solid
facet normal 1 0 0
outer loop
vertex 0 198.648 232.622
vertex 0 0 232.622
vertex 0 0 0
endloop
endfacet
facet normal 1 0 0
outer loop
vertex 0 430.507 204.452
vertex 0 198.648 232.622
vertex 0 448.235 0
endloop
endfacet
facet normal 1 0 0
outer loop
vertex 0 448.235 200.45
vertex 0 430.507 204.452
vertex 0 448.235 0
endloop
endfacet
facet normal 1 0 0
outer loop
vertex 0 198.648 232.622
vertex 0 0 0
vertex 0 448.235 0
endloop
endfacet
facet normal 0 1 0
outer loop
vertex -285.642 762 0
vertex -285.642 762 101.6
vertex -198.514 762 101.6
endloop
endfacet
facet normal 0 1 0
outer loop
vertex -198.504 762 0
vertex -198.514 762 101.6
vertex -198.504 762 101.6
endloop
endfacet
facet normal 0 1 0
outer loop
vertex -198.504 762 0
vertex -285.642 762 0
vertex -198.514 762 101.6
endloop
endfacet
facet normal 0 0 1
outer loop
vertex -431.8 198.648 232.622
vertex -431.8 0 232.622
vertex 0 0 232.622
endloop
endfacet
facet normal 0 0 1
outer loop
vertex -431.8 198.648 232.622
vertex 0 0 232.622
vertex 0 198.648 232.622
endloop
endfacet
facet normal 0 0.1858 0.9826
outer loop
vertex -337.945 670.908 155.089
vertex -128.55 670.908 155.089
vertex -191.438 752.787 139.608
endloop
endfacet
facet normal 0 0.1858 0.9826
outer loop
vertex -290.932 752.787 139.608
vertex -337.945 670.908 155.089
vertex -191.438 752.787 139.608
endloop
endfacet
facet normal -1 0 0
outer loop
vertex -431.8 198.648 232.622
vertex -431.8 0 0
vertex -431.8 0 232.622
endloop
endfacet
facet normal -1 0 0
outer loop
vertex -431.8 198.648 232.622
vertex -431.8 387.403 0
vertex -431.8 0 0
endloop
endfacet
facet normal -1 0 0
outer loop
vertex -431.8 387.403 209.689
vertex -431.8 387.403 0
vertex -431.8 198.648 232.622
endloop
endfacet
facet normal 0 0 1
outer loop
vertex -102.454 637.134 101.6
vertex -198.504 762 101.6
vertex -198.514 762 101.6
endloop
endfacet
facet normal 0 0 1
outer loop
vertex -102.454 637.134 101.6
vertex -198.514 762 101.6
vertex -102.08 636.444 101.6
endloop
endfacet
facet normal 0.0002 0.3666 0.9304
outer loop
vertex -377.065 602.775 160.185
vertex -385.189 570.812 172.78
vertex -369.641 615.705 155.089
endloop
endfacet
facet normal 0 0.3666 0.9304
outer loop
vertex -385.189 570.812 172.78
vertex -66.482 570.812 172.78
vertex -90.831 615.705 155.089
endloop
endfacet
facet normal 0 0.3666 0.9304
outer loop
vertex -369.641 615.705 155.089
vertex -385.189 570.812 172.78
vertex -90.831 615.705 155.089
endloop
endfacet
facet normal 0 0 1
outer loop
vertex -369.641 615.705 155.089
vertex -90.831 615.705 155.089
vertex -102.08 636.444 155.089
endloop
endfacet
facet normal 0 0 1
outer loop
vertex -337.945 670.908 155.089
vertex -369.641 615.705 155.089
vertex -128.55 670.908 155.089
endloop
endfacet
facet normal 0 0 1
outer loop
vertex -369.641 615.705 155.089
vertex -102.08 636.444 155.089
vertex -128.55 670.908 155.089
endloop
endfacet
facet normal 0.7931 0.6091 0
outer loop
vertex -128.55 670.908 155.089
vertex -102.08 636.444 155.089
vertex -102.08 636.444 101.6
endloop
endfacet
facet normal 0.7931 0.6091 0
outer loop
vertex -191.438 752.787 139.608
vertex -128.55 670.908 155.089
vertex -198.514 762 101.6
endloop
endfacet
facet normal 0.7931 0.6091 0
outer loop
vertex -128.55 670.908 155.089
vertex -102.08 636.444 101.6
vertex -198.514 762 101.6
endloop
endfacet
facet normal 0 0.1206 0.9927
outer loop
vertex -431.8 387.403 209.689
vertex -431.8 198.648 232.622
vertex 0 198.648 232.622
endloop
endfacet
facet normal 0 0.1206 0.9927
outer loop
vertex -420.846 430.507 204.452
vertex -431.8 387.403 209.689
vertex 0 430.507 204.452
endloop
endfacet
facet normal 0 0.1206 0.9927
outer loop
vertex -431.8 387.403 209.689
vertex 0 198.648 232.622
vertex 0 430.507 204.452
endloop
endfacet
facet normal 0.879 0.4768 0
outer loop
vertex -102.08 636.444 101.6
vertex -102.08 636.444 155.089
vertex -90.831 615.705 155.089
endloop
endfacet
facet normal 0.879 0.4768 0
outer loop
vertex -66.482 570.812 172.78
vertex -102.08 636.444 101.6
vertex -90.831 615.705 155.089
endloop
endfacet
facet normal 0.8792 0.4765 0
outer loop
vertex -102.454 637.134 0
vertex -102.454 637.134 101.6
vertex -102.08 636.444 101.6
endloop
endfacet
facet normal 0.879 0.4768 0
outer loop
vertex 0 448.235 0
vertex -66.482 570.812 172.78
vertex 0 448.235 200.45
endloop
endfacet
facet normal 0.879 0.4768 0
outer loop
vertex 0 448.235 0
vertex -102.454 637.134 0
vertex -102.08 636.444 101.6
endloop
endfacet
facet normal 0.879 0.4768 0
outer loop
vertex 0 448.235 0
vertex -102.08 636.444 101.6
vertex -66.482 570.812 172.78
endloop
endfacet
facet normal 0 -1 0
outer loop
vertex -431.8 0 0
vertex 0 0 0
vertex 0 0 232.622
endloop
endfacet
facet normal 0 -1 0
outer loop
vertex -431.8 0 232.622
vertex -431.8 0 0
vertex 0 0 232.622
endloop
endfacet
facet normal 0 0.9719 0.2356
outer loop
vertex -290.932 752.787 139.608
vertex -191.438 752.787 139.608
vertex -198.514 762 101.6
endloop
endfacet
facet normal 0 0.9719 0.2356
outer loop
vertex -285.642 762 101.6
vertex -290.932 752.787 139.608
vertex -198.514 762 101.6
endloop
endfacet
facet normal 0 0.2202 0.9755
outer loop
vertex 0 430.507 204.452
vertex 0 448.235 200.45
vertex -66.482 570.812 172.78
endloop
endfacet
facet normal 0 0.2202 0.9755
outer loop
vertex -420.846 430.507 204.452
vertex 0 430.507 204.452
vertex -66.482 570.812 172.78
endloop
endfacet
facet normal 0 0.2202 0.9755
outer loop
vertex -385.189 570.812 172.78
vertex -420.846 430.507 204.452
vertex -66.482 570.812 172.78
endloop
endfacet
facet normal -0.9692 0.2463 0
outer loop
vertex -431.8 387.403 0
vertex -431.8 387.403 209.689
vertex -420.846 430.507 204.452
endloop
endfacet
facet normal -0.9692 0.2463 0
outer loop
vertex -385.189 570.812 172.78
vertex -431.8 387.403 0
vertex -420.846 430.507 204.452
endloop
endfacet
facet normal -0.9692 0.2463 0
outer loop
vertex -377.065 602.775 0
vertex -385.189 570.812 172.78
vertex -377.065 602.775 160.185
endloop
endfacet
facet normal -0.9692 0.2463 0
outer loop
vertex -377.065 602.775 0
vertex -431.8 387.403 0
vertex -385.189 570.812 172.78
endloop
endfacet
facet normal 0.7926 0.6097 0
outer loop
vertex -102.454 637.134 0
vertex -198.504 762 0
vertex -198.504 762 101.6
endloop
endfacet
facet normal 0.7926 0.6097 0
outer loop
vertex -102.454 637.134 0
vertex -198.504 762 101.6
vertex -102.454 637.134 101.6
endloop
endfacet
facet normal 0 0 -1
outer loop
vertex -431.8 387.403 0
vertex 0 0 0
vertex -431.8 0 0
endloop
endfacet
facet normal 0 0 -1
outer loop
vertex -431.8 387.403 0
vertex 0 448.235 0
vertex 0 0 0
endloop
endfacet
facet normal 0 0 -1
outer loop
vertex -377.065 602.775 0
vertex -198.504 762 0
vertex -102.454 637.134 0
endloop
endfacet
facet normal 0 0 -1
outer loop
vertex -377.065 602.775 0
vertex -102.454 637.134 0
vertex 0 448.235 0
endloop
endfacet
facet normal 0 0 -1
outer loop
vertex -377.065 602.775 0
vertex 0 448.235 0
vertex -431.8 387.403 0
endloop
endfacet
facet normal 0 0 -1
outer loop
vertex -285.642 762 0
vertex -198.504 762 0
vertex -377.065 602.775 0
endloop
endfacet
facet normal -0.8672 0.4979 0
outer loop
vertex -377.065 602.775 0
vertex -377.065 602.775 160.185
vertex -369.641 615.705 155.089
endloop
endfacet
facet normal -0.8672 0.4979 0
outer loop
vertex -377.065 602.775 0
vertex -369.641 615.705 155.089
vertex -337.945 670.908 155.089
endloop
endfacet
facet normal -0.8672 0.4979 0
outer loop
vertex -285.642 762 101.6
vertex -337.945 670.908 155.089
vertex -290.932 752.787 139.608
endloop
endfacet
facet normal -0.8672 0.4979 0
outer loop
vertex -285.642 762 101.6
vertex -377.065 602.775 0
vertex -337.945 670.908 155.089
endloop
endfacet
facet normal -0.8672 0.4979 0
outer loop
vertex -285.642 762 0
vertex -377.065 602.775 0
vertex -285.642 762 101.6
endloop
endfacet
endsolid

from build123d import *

# Parameters (mm, degrees)
BOSS_EXTRUDE1_DEPTH = 101.6
BOSS_EXTRUDE2_DEPTH = 431.8
CUT_EXTRUDE1_DEPTH  = 132.021743181
CUT_EXTRUDE2_DEPTH  = 132.021743181
SKETCH5_W           = 672.515990181
SKETCH5_H           = 895.069856367
CUT_EXTRUDE3_DEPTH  = 233.621743181


with BuildPart() as part:
    # Sketch1 → Boss-Extrude1 (new body)
    with BuildSketch(Plane.XY):
        Polygon((0, 0), (431.8, 0), (431.8, 387.403361345), (377.065490396, 602.774956458), (285.641844577, 762), (198.504201681, 762), (102.453781513, 637.134453782), (0, 448.235294118), align=None)
    boss_extrude1 = extrude(amount=BOSS_EXTRUDE1_DEPTH)

    # Sketch2 → Boss-Extrude2 (add)
    with BuildSketch(Plane.ZY):
        Polygon((101.6, 0), (232.621743181, 0), (232.621743181, 198.64821401), (204.451845393, 430.506603568), (172.780455352, 570.81191653), (155.089264466, 615.704741573), (155.089264466, 670.908278379), (139.607943989, 752.787376516), (101.6, 762), align=None)
    boss_extrude2 = extrude(amount=-BOSS_EXTRUDE2_DEPTH)

    # Sketch3 → Cut-Extrude1 (cut, through all)
    with BuildSketch(Plane(origin=(0, 0, 101.6), x_dir=(-1, 0, 0), z_dir=(0, 0, -1))):
        Polygon((0, 448.235294118), (-102.079559314, 636.444481603), (-205.052343037, 770.512583763), (-205.052343037, 987.342816442), (227.879484492, 941.92173413), (179.71587047, 482.849418415), align=None)
    cut_extrude1 = extrude(amount=-CUT_EXTRUDE1_DEPTH, mode=Mode.SUBTRACT)

    # Sketch4 → Cut-Extrude2 (cut, through all)
    with BuildSketch(Plane(origin=(0, 0, 101.6), x_dir=(-1, 0, 0), z_dir=(0, 0, -1))):
        Polygon((-431.8, 387.403361345), (-377.065490396, 602.774956458), (-285.641844577, 762), (-386.647779508, 961.526140846), (-935.090979015, 961.526140846), (-884.913915701, 472.949119069), align=None)
    cut_extrude2 = extrude(amount=-CUT_EXTRUDE2_DEPTH, mode=Mode.SUBTRACT)

    # Mirror1: Boss-Extrude1, Boss-Extrude2, Cut-Extrude1, Cut-Extrude2 across plane
    add(boss_extrude1.mirror(Plane(origin=(0, 0, 0), x_dir=(0, 0, 1), z_dir=(1, 0, 0))))
    add(boss_extrude2.mirror(Plane(origin=(0, 0, 0), x_dir=(0, 0, 1), z_dir=(1, 0, 0))))
    add(cut_extrude1.mirror(Plane(origin=(0, 0, 0), x_dir=(0, 0, 1), z_dir=(1, 0, 0))), mode=Mode.SUBTRACT)
    add(cut_extrude2.mirror(Plane(origin=(0, 0, 0), x_dir=(0, 0, 1), z_dir=(1, 0, 0))), mode=Mode.SUBTRACT)

    # Sketch5 → Cut-Extrude3 (cut, through all)
    with BuildSketch(Plane.XY):
        with Locations((336.257995091, 447.534928184)):
            Rectangle(SKETCH5_W, SKETCH5_H)
    extrude(amount=CUT_EXTRUDE3_DEPTH, mode=Mode.SUBTRACT)


solid = part.part
